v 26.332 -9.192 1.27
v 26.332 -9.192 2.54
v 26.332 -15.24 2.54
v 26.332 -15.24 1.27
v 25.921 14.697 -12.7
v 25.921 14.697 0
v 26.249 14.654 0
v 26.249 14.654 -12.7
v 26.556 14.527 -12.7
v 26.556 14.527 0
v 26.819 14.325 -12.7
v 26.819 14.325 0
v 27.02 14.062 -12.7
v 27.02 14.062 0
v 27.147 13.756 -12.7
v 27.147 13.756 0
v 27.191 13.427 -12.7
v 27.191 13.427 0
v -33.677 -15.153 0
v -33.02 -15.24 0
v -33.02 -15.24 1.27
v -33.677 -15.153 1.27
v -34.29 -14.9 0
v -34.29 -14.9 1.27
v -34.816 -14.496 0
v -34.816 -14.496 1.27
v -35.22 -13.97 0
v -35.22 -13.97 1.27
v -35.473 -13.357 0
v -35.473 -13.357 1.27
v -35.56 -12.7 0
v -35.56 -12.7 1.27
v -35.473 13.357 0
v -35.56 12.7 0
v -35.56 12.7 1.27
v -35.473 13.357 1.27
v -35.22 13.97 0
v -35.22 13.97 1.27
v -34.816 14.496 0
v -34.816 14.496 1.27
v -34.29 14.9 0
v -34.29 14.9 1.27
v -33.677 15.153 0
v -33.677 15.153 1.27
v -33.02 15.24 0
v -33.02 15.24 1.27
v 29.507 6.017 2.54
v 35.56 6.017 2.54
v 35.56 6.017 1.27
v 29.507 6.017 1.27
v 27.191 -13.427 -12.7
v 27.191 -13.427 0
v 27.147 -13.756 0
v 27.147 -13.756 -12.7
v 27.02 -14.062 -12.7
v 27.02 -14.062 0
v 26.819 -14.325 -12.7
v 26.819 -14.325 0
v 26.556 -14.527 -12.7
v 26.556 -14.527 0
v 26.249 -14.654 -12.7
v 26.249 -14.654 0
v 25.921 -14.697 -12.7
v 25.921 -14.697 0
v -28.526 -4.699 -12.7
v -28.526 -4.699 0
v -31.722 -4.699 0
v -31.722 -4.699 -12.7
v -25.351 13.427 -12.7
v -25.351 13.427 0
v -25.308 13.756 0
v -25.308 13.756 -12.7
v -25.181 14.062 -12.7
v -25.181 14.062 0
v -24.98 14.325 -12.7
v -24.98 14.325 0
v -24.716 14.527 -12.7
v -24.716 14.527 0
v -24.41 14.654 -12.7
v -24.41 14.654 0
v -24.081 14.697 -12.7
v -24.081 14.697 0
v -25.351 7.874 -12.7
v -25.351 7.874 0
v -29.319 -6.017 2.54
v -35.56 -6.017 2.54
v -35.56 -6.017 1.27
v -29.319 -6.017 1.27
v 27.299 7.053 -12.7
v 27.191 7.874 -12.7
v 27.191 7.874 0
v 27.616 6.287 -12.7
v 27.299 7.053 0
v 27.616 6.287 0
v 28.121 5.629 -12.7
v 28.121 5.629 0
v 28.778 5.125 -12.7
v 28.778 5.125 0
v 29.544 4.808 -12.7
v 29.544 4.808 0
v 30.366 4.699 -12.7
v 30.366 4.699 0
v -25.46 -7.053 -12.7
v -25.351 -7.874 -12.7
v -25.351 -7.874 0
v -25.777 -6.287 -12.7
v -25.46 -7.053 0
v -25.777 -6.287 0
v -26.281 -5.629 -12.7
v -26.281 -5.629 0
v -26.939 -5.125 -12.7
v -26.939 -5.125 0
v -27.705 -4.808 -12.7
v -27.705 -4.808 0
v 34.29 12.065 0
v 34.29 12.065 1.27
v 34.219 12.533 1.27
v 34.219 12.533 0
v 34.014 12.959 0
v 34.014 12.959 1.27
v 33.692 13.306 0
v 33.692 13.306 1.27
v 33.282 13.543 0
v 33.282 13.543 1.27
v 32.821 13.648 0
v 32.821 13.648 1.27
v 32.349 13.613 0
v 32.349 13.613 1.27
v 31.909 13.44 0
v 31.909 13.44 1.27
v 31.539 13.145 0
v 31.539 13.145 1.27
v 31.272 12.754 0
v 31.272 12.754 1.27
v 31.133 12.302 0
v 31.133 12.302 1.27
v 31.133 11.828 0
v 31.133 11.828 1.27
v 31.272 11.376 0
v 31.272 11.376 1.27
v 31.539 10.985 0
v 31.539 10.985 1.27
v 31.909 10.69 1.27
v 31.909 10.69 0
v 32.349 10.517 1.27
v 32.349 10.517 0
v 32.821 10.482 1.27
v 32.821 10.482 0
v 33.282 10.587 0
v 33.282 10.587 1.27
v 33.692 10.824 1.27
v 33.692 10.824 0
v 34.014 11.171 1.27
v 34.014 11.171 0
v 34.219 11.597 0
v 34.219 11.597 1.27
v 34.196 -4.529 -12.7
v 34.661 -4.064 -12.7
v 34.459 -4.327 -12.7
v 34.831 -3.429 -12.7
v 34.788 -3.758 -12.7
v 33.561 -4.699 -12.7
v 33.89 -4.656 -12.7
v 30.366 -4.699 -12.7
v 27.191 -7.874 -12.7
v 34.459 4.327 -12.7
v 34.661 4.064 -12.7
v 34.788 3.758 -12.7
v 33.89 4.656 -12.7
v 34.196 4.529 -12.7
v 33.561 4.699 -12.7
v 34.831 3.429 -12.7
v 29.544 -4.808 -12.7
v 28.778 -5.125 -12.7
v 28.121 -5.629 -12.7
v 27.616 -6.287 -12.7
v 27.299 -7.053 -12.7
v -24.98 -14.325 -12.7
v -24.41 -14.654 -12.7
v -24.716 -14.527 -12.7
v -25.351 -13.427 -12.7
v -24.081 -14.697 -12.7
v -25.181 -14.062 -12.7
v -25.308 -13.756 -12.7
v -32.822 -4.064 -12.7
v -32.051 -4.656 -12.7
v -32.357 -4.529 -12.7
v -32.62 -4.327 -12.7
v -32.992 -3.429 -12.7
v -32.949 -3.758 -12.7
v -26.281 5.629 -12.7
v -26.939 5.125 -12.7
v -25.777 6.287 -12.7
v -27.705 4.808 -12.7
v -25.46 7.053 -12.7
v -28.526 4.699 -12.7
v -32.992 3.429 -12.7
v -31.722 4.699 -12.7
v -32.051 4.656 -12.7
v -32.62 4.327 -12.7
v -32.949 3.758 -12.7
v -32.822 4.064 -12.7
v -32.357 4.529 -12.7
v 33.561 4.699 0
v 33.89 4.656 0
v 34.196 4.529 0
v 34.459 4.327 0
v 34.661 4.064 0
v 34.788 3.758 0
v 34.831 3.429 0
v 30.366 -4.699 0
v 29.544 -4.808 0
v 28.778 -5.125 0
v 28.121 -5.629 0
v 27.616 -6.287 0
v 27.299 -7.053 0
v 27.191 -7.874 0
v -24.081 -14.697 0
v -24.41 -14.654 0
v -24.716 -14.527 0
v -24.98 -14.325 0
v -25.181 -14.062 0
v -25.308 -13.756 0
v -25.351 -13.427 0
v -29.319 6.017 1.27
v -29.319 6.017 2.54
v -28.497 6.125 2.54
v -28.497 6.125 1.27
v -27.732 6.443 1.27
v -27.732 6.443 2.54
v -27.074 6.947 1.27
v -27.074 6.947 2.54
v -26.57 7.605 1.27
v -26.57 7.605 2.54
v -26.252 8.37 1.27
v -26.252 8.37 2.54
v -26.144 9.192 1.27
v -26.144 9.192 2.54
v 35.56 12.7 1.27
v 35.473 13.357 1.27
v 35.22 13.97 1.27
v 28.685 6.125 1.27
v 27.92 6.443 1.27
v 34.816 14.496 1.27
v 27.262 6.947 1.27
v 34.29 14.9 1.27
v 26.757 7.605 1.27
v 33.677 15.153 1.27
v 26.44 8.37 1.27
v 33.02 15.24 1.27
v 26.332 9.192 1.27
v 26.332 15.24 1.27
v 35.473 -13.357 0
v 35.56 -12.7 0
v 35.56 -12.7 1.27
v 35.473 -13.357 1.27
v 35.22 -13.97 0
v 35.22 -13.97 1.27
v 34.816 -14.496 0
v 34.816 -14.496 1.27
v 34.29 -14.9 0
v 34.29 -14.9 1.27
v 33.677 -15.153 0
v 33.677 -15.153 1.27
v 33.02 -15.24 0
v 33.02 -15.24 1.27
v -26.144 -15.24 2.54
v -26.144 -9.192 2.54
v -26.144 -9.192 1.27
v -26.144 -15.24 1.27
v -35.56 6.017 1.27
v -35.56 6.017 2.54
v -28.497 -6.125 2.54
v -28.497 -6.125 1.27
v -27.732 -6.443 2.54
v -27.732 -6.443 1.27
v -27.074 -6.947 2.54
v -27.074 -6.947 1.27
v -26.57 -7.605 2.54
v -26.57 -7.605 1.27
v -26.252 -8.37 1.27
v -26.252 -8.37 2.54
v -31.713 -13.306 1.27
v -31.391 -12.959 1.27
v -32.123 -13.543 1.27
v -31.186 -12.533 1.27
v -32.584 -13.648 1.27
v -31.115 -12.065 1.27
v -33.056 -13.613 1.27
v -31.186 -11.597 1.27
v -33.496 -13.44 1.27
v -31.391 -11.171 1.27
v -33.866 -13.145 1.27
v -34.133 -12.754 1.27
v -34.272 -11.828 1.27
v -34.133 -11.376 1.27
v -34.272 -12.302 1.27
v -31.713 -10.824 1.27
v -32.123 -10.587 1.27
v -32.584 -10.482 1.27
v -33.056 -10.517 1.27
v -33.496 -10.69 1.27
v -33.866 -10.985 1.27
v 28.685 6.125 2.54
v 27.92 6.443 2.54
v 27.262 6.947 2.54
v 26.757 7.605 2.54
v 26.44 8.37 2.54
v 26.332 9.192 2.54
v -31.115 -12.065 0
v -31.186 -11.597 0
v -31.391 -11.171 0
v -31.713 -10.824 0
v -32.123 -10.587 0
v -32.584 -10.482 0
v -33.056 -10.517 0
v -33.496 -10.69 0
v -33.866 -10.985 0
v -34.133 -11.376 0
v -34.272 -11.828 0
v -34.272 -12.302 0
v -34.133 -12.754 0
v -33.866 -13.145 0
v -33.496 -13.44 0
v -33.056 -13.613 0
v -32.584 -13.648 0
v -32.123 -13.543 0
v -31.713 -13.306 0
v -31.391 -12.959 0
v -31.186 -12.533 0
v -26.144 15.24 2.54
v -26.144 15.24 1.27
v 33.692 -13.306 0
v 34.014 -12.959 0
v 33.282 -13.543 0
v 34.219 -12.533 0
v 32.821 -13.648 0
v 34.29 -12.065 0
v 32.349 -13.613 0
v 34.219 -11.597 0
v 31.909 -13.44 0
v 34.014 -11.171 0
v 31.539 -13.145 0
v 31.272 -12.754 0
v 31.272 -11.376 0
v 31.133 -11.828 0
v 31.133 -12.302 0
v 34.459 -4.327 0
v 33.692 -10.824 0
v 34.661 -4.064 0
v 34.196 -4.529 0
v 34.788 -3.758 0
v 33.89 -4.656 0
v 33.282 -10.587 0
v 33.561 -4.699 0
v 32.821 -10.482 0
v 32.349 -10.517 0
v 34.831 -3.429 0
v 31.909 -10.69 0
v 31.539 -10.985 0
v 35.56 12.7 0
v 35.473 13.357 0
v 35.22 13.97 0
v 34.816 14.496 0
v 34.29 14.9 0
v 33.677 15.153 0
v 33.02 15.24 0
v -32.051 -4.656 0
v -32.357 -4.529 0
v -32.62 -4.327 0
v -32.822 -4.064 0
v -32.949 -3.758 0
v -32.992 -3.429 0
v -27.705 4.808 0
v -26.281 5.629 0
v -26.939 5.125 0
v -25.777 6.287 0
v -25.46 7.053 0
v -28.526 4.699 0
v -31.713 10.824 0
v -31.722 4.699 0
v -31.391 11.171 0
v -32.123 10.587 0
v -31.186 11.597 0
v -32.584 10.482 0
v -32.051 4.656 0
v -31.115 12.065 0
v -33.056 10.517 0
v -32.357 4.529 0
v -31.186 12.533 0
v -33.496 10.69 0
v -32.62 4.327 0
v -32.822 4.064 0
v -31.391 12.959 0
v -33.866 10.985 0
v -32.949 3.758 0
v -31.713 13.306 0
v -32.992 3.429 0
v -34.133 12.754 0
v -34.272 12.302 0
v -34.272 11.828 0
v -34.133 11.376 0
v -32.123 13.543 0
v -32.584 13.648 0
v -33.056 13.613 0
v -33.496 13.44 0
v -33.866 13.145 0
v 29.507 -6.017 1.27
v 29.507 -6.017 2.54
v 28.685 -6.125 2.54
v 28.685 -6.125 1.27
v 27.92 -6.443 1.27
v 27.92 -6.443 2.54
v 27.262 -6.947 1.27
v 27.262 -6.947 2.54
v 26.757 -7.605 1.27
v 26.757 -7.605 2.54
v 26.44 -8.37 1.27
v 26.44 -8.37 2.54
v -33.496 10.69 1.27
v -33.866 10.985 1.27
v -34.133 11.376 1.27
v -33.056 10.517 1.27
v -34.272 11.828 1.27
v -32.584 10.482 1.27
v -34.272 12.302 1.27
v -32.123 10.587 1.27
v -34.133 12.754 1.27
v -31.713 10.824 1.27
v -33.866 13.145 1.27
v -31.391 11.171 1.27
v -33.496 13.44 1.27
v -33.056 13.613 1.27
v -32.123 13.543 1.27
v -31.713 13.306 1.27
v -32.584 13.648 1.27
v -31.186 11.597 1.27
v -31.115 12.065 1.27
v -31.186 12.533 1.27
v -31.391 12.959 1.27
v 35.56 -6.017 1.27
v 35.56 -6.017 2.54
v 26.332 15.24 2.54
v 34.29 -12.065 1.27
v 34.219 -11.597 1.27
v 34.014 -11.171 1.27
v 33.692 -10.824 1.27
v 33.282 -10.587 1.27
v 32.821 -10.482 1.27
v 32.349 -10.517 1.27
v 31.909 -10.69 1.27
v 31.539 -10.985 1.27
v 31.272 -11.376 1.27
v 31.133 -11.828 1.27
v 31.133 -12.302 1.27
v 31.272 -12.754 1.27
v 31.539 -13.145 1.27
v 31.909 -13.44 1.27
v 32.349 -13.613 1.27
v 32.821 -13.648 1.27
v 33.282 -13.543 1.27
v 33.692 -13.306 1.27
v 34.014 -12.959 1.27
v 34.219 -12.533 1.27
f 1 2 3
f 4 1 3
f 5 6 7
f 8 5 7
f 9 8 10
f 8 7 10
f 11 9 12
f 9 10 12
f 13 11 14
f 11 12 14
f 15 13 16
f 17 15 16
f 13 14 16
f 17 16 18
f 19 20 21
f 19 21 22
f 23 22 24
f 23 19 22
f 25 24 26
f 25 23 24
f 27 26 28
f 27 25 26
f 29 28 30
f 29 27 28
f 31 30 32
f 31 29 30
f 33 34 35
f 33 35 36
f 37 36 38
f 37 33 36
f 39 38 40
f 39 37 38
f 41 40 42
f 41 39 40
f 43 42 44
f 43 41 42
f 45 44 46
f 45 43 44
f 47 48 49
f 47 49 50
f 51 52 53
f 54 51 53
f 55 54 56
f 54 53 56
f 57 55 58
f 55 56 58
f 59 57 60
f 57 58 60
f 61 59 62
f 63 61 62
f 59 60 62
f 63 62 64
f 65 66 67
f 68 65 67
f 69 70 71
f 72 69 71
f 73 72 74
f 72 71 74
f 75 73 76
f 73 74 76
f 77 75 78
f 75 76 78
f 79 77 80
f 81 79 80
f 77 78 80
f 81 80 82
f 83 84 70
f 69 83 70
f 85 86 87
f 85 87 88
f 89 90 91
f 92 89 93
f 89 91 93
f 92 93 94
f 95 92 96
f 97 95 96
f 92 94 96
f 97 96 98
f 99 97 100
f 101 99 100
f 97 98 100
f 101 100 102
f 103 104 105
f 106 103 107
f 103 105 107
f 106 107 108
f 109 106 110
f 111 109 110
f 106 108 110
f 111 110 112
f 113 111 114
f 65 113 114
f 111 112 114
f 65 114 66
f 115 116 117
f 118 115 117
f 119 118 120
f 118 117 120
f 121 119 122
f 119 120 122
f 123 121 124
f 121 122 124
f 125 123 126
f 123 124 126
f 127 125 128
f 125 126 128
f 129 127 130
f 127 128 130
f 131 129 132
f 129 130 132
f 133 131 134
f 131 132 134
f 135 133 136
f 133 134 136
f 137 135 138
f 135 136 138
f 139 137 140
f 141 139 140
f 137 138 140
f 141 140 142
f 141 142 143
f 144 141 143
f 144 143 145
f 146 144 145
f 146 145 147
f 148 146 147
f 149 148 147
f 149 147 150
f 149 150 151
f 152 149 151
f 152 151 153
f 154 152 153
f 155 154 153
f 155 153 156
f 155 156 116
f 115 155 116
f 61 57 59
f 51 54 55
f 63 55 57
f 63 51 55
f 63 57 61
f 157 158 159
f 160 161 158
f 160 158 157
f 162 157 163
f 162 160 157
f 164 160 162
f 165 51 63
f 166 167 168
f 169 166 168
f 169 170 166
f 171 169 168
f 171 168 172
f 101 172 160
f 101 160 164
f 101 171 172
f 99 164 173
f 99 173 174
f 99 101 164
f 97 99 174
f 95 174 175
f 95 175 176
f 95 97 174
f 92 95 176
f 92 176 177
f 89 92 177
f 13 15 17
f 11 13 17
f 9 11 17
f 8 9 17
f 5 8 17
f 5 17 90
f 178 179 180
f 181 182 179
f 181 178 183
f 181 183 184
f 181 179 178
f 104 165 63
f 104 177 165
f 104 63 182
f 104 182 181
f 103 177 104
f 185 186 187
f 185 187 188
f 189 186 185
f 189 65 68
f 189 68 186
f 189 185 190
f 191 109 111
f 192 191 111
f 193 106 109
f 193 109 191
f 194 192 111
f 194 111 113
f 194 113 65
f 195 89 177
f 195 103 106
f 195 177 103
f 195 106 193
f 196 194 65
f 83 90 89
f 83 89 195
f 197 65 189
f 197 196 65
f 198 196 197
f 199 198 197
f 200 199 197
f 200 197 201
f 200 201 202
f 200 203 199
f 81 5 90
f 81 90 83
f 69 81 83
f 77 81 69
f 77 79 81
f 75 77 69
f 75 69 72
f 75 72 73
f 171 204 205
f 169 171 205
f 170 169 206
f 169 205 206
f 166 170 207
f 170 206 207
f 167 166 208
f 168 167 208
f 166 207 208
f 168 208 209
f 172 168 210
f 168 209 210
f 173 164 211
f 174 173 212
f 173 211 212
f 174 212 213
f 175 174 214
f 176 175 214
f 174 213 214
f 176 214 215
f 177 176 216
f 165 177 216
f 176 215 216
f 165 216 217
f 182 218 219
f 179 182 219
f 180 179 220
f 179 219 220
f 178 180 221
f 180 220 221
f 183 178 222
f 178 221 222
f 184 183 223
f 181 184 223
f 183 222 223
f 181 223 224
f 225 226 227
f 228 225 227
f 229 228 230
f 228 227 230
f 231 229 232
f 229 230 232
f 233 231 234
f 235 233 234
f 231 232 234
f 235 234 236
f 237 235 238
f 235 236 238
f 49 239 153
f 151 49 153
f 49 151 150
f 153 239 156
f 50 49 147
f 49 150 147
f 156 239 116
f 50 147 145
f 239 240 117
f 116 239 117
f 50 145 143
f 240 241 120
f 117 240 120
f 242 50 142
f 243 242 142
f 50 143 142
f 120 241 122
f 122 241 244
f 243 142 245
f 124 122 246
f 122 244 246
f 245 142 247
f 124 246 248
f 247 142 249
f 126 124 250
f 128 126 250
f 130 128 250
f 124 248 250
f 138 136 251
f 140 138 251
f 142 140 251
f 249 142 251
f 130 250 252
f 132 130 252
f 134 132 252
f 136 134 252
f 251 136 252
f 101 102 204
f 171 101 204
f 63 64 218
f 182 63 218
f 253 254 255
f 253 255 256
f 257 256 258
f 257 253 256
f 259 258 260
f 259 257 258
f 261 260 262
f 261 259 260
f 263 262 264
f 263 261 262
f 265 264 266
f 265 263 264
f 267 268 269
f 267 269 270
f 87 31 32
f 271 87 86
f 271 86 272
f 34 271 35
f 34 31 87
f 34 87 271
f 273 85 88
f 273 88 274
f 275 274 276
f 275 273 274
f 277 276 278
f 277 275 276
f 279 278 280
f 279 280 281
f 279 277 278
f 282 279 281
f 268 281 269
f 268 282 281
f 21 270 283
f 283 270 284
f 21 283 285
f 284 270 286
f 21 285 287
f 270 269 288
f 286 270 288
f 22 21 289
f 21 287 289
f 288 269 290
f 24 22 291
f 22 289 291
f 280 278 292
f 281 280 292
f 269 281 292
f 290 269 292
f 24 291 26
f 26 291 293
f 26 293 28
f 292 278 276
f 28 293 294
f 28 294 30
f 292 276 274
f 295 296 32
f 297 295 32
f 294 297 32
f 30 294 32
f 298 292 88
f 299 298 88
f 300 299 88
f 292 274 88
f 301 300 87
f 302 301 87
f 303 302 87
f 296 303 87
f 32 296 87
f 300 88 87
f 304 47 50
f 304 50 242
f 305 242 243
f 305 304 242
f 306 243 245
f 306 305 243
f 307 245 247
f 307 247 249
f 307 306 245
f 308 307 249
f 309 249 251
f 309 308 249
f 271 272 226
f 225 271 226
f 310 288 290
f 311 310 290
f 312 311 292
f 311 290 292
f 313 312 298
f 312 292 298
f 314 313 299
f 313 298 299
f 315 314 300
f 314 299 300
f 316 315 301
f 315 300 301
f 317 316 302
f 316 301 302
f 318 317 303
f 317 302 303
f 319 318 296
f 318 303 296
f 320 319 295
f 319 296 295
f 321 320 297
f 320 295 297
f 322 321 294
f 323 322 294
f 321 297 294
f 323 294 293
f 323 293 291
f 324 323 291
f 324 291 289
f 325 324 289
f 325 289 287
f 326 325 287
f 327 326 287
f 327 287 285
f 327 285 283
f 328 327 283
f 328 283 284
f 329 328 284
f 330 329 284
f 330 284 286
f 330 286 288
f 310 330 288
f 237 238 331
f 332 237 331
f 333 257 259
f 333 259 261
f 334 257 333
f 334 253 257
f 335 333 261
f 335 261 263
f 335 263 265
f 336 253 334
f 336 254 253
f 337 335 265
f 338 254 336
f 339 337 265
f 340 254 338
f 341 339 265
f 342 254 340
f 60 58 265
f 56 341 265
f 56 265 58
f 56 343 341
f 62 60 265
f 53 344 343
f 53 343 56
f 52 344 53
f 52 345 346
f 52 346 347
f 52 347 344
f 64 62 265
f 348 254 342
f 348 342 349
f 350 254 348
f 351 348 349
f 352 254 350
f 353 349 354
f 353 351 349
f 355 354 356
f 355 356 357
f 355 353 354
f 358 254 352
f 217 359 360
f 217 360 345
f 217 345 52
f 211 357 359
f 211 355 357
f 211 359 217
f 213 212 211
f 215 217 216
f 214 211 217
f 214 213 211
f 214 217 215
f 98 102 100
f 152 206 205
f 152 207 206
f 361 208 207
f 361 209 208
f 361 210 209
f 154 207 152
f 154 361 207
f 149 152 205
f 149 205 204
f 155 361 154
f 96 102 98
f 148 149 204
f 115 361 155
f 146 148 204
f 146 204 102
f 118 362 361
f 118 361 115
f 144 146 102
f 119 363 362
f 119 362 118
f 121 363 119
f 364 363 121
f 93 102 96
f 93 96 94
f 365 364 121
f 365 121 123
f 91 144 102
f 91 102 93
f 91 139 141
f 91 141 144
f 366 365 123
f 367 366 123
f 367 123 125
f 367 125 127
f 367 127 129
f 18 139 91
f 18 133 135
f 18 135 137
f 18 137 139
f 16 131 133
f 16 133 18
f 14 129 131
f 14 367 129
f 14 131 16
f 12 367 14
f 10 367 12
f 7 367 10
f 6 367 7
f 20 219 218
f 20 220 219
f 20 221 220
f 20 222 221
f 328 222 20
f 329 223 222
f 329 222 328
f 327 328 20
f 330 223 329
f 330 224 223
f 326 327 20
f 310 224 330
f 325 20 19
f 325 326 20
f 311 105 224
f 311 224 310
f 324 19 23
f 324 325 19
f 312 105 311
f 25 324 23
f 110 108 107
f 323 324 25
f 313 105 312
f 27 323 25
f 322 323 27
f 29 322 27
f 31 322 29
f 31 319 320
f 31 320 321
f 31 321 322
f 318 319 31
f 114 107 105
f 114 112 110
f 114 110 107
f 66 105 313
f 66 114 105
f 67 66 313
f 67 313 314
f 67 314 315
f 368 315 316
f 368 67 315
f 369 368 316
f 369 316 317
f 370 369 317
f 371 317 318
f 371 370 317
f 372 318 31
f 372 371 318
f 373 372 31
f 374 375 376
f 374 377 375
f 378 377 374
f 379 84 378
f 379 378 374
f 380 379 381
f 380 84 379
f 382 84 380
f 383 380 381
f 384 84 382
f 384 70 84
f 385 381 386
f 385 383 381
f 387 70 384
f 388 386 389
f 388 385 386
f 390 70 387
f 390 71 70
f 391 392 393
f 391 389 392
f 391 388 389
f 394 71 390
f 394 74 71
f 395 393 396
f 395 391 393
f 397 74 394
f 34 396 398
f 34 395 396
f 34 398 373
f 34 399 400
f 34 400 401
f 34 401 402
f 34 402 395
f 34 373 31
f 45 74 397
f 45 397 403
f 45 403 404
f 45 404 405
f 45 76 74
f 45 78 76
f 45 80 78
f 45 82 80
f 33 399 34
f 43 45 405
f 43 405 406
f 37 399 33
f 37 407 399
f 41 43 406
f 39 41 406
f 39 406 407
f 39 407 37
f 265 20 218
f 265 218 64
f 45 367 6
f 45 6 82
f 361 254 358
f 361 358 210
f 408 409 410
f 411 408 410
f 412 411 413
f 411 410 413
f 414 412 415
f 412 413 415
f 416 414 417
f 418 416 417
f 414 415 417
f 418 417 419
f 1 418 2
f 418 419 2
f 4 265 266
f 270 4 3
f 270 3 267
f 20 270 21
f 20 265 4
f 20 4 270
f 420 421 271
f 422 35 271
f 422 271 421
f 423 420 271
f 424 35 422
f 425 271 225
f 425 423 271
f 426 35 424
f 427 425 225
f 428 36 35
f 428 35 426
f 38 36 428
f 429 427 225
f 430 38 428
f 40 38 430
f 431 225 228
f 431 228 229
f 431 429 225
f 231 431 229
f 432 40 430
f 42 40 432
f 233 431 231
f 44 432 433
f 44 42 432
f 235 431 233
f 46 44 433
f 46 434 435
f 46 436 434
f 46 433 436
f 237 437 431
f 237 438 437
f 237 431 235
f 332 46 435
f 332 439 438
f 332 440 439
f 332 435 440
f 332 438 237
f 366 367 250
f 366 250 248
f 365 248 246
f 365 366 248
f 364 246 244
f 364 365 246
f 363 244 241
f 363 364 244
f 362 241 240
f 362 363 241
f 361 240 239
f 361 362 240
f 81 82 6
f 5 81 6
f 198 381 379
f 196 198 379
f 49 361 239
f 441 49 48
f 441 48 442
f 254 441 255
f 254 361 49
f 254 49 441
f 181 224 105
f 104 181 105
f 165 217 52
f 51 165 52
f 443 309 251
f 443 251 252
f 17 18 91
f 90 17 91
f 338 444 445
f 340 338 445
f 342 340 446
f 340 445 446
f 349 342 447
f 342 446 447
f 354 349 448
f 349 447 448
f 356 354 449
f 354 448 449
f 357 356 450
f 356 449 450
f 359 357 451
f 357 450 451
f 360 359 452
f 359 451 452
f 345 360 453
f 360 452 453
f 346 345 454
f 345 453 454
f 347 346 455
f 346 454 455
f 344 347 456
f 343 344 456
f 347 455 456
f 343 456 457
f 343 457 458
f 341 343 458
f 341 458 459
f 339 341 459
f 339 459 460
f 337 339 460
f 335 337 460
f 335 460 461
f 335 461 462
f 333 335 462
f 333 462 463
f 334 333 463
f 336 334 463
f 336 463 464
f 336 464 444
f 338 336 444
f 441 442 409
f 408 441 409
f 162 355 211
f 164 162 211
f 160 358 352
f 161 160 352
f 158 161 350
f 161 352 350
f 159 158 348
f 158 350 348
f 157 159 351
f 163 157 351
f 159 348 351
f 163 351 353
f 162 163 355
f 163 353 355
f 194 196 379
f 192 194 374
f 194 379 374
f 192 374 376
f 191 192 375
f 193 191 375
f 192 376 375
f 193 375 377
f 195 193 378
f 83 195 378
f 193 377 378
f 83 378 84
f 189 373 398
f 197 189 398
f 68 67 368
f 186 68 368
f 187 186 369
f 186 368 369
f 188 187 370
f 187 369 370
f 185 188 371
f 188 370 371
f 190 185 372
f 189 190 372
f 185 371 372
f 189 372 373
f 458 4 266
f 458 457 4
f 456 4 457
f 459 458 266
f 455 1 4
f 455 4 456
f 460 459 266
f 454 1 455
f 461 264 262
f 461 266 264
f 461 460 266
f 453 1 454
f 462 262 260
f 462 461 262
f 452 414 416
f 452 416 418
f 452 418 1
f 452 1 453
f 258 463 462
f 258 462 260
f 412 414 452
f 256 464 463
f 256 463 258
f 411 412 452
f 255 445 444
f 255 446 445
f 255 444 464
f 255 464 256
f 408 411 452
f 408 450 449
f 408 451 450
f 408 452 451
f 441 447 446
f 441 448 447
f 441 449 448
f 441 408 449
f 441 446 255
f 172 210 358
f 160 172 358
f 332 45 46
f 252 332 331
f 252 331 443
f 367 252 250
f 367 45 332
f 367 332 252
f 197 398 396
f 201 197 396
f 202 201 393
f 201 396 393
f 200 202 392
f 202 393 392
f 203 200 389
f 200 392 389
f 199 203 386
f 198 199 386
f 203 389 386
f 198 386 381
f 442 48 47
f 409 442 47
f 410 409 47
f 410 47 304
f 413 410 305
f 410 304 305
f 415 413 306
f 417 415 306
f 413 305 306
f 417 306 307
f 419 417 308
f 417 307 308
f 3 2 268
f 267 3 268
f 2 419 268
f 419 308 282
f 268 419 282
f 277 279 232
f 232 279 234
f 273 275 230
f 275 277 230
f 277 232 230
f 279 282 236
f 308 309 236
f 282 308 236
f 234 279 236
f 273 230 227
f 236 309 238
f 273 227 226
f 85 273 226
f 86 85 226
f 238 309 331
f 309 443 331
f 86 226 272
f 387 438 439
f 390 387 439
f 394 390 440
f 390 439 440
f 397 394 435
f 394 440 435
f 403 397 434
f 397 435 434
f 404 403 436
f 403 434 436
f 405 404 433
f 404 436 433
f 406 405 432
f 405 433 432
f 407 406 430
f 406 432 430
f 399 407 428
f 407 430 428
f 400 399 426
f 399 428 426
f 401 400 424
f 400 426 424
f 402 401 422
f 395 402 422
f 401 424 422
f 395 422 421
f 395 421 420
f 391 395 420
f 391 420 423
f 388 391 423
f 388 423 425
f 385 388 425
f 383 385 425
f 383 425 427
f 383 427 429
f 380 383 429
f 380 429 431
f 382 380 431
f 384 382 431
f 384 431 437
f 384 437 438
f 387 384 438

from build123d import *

# Parameters (mm, degrees)
BOSS_EXTRUDE1_DEPTH = 2.54
BOSS_EXTRUDE2_DEPTH = 12.7
SKETCH3_R           = 1.5875
CUT_EXTRUDE1_DEPTH  = 5.08
CUT_EXTRUDE2_DEPTH  = 1.27


with BuildPart() as part:
    # Sketch1 → Boss-Extrude1 (new body)
    with BuildSketch(Plane.XY):
        with BuildLine():
            Line((33.02, -15.24), (-33.02, -15.24))
            ThreePointArc((-33.02, -15.24), (-34.816051224, -14.496051224), (-35.56, -12.7))
            Line((-35.56, -12.7), (-35.56, 12.7))
            ThreePointArc((-35.56, 12.7), (-34.816051224, 14.496051224), (-33.02, 15.24))
            Line((-33.02, 15.24), (33.02, 15.24))
            ThreePointArc((33.02, 15.24), (34.816051224, 14.496051224), (35.56, 12.7))
            Line((35.56, 12.7), (35.56, -12.7))
            ThreePointArc((35.56, -12.7), (34.816051224, -14.496051224), (33.02, -15.24))
        make_face()
    extrude(amount=BOSS_EXTRUDE1_DEPTH)

    # Sketch2 → Boss-Extrude2 (add)
    with BuildSketch(Plane(origin=(0, 0, 0), x_dir=(-1, 0, 0), z_dir=(0, 0, -1))):
        with BuildLine():
            Line((-34.831192975, 3.429443631), (-34.831192975, -3.429443631))
            ThreePointArc((-34.831192975, -3.429443631), (-34.459218588, -4.327469243), (-33.561192975, -4.699443631))
            Line((-33.561192975, -4.699443631), (-30.365638197, -4.699443631))
            ThreePointArc((-30.365638197, -4.699443631), (-28.120574167, -5.629379601), (-27.190638197, -7.874443631))
            Line((-27.190638197, -7.874443631), (-27.190638197, -13.426949666))
            ThreePointArc((-27.190638197, -13.426949666), (-26.818663809, -14.324975278), (-25.920638197, -14.696949666))
            Line((-25.920638197, -14.696949666), (24.081493188, -14.696949666))
            ThreePointArc((24.081493188, -14.696949666), (24.9795188, -14.324975278), (25.351493188, -13.426949666))
            Line((25.351493188, -13.426949666), (25.351493188, -7.874443631))
            ThreePointArc((25.351493188, -7.874443631), (26.281429158, -5.629379601), (28.526493188, -4.699443631))
            Line((28.526493188, -4.699443631), (31.722047967, -4.699443631))
            ThreePointArc((31.722047967, -4.699443631), (32.620073579, -4.327469243), (32.992047967, -3.429443631))
            Line((32.992047967, -3.429443631), (32.992047967, 3.429443631))
            ThreePointArc((32.992047967, 3.429443631), (32.620073579, 4.327469243), (31.722047967, 4.699443631))
            Line((31.722047967, 4.699443631), (28.526493188, 4.699443631))
            ThreePointArc((28.526493188, 4.699443631), (26.281429158, 5.629379601), (25.351493188, 7.874443631))
            Line((25.351493188, 7.874443631), (25.351493188, 13.426949666))
            ThreePointArc((25.351493188, 13.426949666), (24.9795188, 14.324975278), (24.081493188, 14.696949666))
            Line((24.081493188, 14.696949666), (-25.920638197, 14.696949666))
            ThreePointArc((-25.920638197, 14.696949666), (-26.818663809, 14.324975278), (-27.190638197, 13.426949666))
            Line((-27.190638197, 13.426949666), (-27.190638197, 7.874443631))
            ThreePointArc((-27.190638197, 7.874443631), (-28.120574167, 5.629379601), (-30.365638197, 4.699443631))
            Line((-30.365638197, 4.699443631), (-33.561192975, 4.699443631))
            ThreePointArc((-33.561192975, 4.699443631), (-34.459218588, 4.327469243), (-34.831192975, 3.429443631))
        make_face()
    extrude(amount=BOSS_EXTRUDE2_DEPTH)

    # Sketch3 → Cut-Extrude1 (cut)
    with BuildSketch(Plane.XY.offset(2.54)):
        with Locations((32.7025, -12.065)):
            Circle(SKETCH3_R)
        with Locations((32.7025, 12.065)):
            Circle(SKETCH3_R)
        with Locations((-32.7025, 12.065)):
            Circle(SKETCH3_R)
        with Locations((-32.7025, -12.065)):
            Circle(SKETCH3_R)
    extrude(amount=-CUT_EXTRUDE1_DEPTH, mode=Mode.SUBTRACT)

    # Sketch4 → Cut-Extrude2 (cut)
    with BuildSketch(Plane.XY.offset(2.54)):
        with BuildLine():
            Line((-35.56, -6.017135468), (-29.319201094, -6.017135468))
            ThreePointArc((-29.319201094, -6.017135468), (-27.074137064, -6.947071437), (-26.144201094, -9.192135468))
            Line((-26.144201094, -9.192135468), (-26.144201094, -15.24))
            Line((-26.144201094, -15.24), (-35.56, -15.24))
            Line((-35.56, -15.24), (-35.56, -6.017135468))
        make_face()
        with BuildLine():
            Line((35.56, -6.017135468), (29.50710146, -6.017135468))
            ThreePointArc((29.50710146, -6.017135468), (27.26203743, -6.947071437), (26.33210146, -9.192135468))
            Line((26.33210146, -9.192135468), (26.33210146, -15.24))
            Line((26.33210146, -15.24), (35.56, -15.24))
            Line((35.56, -15.24), (35.56, -6.017135468))
        make_face()
        with BuildLine():
            Line((26.33210146, 9.192135468), (26.33210146, 15.24))
            Line((26.33210146, 15.24), (35.56, 15.24))
            Line((35.56, 15.24), (35.56, 6.017135468))
            Line((35.56, 6.017135468), (29.50710146, 6.017135468))
            ThreePointArc((29.50710146, 6.017135468), (27.26203743, 6.947071437), (26.33210146, 9.192135468))
        make_face()
        with BuildLine():
            Line((-26.144201094, 9.192135468), (-26.144201094, 15.24))
            Line((-26.144201094, 15.24), (-35.56, 15.24))
            Line((-35.56, 15.24), (-35.56, 6.017135468))
            Line((-35.56, 6.017135468), (-29.319201094, 6.017135468))
            ThreePointArc((-29.319201094, 6.017135468), (-27.074137064, 6.947071437), (-26.144201094, 9.192135468))
        make_face()
    extrude(amount=-CUT_EXTRUDE2_DEPTH, mode=Mode.SUBTRACT)


solid = part.part
